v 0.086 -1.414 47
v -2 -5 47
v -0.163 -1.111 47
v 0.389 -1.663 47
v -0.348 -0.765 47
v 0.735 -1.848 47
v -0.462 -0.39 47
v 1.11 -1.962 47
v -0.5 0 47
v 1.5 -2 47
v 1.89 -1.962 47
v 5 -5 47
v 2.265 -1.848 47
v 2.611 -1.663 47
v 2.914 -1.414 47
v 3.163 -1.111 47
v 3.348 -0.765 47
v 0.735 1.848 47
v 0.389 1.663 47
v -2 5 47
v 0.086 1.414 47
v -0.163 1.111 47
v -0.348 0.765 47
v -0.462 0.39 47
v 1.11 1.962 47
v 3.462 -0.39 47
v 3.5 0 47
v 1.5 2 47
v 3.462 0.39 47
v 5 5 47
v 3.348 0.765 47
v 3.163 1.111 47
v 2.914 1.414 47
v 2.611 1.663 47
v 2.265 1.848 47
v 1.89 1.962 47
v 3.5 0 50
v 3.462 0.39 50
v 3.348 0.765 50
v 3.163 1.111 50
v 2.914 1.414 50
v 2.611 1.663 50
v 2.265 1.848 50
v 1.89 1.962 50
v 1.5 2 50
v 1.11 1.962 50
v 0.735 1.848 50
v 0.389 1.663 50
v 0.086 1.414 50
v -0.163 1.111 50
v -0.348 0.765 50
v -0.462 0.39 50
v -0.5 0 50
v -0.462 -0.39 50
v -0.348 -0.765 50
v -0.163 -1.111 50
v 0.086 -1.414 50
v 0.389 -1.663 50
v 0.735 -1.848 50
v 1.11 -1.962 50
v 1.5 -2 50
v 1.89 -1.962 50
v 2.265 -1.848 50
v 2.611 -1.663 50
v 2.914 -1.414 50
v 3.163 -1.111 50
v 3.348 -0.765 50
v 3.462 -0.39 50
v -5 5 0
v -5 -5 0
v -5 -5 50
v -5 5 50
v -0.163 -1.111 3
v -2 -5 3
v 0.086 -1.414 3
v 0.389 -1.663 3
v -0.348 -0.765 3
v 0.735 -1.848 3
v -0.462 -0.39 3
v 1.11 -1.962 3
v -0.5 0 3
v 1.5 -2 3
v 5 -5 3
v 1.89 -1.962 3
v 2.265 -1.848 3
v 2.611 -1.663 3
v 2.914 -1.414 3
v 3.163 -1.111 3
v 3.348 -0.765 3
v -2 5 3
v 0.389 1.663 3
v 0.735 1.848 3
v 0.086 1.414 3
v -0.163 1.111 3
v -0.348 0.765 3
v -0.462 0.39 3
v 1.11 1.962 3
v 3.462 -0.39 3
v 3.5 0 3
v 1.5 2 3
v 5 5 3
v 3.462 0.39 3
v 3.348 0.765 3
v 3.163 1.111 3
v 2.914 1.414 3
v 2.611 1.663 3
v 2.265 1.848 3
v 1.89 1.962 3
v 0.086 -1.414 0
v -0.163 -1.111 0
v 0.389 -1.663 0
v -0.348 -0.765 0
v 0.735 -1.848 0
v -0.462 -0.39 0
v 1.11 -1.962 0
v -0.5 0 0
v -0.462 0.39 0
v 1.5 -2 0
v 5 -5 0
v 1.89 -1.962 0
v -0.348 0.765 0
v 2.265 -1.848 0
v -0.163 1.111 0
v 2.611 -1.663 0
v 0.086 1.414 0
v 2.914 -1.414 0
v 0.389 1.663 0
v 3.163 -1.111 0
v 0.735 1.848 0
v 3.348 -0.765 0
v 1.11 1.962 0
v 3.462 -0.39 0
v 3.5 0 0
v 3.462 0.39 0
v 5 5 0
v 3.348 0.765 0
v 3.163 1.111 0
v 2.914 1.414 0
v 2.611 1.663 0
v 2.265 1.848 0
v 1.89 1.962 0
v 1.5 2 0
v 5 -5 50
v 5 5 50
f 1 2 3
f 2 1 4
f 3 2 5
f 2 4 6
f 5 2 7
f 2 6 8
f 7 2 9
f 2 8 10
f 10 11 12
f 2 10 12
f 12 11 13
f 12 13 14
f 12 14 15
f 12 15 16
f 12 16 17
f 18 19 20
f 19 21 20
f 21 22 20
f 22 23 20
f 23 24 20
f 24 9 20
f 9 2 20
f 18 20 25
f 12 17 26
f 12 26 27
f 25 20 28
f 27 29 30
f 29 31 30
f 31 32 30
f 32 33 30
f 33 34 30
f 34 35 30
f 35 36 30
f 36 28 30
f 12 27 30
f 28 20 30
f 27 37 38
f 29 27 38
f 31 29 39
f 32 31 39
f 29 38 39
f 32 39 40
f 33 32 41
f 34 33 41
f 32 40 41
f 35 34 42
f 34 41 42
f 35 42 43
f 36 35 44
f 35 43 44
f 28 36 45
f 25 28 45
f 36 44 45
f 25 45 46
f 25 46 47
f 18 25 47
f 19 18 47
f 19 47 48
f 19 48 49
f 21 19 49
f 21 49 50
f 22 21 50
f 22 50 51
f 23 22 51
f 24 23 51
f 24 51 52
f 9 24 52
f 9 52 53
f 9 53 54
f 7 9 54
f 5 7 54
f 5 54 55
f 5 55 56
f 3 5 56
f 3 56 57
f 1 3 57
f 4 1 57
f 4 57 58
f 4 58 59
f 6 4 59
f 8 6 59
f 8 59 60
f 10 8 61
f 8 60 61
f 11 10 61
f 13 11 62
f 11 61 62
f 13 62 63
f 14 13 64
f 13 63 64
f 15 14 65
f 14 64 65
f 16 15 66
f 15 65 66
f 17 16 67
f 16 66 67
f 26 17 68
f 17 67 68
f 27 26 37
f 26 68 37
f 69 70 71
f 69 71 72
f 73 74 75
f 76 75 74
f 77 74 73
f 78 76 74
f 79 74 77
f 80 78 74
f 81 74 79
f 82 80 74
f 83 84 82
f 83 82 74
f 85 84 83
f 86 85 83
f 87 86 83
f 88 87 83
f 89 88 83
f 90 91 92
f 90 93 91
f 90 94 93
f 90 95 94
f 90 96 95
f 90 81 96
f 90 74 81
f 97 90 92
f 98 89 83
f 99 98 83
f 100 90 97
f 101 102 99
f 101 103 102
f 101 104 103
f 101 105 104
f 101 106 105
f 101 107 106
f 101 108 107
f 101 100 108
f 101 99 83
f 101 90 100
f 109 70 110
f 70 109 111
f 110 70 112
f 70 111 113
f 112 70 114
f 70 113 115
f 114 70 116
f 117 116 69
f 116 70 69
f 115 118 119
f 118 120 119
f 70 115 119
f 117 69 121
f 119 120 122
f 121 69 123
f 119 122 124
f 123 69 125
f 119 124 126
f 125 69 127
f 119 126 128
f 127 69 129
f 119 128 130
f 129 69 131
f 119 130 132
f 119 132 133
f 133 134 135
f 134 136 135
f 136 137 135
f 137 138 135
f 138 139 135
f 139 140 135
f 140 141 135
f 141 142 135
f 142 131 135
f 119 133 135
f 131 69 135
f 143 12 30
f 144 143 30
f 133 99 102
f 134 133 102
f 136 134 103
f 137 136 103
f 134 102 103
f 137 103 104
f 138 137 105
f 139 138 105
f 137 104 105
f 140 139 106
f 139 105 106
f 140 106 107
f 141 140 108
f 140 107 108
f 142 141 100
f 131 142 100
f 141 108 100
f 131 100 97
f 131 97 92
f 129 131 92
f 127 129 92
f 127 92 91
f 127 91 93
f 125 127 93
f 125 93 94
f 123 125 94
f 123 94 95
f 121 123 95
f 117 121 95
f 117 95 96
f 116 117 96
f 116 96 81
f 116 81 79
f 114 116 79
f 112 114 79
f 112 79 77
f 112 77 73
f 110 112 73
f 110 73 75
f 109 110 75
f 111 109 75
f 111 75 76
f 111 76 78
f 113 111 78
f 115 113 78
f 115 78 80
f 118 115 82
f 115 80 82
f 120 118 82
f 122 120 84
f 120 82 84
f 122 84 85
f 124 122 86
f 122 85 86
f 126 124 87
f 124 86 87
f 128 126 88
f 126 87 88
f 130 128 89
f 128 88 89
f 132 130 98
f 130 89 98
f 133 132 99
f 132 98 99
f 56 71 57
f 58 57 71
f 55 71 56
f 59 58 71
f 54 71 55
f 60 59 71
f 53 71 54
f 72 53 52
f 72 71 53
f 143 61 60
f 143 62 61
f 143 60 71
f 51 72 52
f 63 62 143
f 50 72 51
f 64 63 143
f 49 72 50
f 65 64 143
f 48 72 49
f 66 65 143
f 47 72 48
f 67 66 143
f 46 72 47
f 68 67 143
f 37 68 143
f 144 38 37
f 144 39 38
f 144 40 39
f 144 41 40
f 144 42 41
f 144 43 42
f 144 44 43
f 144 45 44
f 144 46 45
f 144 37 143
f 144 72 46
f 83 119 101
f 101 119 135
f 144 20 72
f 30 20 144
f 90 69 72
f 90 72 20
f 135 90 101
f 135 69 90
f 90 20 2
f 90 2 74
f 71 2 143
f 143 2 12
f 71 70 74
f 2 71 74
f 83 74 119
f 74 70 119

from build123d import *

# Parameters (mm, degrees)
SKETCH1_W           = 10
SKETCH1_H           = 10
BOSS_EXTRUDE1_DEPTH = 50
SKETCH2_W           = 7
SKETCH2_H           = 44
CUT_EXTRUDE1_DEPTH  = 11
SKETCH3_R           = 2
CUT_EXTRUDE2_DEPTH  = 71


with BuildPart() as part:
    # Sketch1 → Boss-Extrude1 (new body)
    with BuildSketch(Plane.XY):
        Rectangle(SKETCH1_W, SKETCH1_H)
    extrude(amount=BOSS_EXTRUDE1_DEPTH)

    # Sketch2 → Cut-Extrude1 (cut)
    with BuildSketch(Plane(origin=(0, 5, 0), x_dir=(1, 0, 0), z_dir=(0, 1, 0))):
        with Locations((1.5, -25)):
            Rectangle(SKETCH2_W, SKETCH2_H)
    extrude(amount=-CUT_EXTRUDE1_DEPTH, mode=Mode.SUBTRACT)

    # Sketch3 → Cut-Extrude2 (cut)
    with BuildSketch(Plane.XY.offset(50)):
        with Locations((1.5, 0)):
            Circle(SKETCH3_R)
    extrude(amount=-CUT_EXTRUDE2_DEPTH, mode=Mode.SUBTRACT)


solid = part.part
